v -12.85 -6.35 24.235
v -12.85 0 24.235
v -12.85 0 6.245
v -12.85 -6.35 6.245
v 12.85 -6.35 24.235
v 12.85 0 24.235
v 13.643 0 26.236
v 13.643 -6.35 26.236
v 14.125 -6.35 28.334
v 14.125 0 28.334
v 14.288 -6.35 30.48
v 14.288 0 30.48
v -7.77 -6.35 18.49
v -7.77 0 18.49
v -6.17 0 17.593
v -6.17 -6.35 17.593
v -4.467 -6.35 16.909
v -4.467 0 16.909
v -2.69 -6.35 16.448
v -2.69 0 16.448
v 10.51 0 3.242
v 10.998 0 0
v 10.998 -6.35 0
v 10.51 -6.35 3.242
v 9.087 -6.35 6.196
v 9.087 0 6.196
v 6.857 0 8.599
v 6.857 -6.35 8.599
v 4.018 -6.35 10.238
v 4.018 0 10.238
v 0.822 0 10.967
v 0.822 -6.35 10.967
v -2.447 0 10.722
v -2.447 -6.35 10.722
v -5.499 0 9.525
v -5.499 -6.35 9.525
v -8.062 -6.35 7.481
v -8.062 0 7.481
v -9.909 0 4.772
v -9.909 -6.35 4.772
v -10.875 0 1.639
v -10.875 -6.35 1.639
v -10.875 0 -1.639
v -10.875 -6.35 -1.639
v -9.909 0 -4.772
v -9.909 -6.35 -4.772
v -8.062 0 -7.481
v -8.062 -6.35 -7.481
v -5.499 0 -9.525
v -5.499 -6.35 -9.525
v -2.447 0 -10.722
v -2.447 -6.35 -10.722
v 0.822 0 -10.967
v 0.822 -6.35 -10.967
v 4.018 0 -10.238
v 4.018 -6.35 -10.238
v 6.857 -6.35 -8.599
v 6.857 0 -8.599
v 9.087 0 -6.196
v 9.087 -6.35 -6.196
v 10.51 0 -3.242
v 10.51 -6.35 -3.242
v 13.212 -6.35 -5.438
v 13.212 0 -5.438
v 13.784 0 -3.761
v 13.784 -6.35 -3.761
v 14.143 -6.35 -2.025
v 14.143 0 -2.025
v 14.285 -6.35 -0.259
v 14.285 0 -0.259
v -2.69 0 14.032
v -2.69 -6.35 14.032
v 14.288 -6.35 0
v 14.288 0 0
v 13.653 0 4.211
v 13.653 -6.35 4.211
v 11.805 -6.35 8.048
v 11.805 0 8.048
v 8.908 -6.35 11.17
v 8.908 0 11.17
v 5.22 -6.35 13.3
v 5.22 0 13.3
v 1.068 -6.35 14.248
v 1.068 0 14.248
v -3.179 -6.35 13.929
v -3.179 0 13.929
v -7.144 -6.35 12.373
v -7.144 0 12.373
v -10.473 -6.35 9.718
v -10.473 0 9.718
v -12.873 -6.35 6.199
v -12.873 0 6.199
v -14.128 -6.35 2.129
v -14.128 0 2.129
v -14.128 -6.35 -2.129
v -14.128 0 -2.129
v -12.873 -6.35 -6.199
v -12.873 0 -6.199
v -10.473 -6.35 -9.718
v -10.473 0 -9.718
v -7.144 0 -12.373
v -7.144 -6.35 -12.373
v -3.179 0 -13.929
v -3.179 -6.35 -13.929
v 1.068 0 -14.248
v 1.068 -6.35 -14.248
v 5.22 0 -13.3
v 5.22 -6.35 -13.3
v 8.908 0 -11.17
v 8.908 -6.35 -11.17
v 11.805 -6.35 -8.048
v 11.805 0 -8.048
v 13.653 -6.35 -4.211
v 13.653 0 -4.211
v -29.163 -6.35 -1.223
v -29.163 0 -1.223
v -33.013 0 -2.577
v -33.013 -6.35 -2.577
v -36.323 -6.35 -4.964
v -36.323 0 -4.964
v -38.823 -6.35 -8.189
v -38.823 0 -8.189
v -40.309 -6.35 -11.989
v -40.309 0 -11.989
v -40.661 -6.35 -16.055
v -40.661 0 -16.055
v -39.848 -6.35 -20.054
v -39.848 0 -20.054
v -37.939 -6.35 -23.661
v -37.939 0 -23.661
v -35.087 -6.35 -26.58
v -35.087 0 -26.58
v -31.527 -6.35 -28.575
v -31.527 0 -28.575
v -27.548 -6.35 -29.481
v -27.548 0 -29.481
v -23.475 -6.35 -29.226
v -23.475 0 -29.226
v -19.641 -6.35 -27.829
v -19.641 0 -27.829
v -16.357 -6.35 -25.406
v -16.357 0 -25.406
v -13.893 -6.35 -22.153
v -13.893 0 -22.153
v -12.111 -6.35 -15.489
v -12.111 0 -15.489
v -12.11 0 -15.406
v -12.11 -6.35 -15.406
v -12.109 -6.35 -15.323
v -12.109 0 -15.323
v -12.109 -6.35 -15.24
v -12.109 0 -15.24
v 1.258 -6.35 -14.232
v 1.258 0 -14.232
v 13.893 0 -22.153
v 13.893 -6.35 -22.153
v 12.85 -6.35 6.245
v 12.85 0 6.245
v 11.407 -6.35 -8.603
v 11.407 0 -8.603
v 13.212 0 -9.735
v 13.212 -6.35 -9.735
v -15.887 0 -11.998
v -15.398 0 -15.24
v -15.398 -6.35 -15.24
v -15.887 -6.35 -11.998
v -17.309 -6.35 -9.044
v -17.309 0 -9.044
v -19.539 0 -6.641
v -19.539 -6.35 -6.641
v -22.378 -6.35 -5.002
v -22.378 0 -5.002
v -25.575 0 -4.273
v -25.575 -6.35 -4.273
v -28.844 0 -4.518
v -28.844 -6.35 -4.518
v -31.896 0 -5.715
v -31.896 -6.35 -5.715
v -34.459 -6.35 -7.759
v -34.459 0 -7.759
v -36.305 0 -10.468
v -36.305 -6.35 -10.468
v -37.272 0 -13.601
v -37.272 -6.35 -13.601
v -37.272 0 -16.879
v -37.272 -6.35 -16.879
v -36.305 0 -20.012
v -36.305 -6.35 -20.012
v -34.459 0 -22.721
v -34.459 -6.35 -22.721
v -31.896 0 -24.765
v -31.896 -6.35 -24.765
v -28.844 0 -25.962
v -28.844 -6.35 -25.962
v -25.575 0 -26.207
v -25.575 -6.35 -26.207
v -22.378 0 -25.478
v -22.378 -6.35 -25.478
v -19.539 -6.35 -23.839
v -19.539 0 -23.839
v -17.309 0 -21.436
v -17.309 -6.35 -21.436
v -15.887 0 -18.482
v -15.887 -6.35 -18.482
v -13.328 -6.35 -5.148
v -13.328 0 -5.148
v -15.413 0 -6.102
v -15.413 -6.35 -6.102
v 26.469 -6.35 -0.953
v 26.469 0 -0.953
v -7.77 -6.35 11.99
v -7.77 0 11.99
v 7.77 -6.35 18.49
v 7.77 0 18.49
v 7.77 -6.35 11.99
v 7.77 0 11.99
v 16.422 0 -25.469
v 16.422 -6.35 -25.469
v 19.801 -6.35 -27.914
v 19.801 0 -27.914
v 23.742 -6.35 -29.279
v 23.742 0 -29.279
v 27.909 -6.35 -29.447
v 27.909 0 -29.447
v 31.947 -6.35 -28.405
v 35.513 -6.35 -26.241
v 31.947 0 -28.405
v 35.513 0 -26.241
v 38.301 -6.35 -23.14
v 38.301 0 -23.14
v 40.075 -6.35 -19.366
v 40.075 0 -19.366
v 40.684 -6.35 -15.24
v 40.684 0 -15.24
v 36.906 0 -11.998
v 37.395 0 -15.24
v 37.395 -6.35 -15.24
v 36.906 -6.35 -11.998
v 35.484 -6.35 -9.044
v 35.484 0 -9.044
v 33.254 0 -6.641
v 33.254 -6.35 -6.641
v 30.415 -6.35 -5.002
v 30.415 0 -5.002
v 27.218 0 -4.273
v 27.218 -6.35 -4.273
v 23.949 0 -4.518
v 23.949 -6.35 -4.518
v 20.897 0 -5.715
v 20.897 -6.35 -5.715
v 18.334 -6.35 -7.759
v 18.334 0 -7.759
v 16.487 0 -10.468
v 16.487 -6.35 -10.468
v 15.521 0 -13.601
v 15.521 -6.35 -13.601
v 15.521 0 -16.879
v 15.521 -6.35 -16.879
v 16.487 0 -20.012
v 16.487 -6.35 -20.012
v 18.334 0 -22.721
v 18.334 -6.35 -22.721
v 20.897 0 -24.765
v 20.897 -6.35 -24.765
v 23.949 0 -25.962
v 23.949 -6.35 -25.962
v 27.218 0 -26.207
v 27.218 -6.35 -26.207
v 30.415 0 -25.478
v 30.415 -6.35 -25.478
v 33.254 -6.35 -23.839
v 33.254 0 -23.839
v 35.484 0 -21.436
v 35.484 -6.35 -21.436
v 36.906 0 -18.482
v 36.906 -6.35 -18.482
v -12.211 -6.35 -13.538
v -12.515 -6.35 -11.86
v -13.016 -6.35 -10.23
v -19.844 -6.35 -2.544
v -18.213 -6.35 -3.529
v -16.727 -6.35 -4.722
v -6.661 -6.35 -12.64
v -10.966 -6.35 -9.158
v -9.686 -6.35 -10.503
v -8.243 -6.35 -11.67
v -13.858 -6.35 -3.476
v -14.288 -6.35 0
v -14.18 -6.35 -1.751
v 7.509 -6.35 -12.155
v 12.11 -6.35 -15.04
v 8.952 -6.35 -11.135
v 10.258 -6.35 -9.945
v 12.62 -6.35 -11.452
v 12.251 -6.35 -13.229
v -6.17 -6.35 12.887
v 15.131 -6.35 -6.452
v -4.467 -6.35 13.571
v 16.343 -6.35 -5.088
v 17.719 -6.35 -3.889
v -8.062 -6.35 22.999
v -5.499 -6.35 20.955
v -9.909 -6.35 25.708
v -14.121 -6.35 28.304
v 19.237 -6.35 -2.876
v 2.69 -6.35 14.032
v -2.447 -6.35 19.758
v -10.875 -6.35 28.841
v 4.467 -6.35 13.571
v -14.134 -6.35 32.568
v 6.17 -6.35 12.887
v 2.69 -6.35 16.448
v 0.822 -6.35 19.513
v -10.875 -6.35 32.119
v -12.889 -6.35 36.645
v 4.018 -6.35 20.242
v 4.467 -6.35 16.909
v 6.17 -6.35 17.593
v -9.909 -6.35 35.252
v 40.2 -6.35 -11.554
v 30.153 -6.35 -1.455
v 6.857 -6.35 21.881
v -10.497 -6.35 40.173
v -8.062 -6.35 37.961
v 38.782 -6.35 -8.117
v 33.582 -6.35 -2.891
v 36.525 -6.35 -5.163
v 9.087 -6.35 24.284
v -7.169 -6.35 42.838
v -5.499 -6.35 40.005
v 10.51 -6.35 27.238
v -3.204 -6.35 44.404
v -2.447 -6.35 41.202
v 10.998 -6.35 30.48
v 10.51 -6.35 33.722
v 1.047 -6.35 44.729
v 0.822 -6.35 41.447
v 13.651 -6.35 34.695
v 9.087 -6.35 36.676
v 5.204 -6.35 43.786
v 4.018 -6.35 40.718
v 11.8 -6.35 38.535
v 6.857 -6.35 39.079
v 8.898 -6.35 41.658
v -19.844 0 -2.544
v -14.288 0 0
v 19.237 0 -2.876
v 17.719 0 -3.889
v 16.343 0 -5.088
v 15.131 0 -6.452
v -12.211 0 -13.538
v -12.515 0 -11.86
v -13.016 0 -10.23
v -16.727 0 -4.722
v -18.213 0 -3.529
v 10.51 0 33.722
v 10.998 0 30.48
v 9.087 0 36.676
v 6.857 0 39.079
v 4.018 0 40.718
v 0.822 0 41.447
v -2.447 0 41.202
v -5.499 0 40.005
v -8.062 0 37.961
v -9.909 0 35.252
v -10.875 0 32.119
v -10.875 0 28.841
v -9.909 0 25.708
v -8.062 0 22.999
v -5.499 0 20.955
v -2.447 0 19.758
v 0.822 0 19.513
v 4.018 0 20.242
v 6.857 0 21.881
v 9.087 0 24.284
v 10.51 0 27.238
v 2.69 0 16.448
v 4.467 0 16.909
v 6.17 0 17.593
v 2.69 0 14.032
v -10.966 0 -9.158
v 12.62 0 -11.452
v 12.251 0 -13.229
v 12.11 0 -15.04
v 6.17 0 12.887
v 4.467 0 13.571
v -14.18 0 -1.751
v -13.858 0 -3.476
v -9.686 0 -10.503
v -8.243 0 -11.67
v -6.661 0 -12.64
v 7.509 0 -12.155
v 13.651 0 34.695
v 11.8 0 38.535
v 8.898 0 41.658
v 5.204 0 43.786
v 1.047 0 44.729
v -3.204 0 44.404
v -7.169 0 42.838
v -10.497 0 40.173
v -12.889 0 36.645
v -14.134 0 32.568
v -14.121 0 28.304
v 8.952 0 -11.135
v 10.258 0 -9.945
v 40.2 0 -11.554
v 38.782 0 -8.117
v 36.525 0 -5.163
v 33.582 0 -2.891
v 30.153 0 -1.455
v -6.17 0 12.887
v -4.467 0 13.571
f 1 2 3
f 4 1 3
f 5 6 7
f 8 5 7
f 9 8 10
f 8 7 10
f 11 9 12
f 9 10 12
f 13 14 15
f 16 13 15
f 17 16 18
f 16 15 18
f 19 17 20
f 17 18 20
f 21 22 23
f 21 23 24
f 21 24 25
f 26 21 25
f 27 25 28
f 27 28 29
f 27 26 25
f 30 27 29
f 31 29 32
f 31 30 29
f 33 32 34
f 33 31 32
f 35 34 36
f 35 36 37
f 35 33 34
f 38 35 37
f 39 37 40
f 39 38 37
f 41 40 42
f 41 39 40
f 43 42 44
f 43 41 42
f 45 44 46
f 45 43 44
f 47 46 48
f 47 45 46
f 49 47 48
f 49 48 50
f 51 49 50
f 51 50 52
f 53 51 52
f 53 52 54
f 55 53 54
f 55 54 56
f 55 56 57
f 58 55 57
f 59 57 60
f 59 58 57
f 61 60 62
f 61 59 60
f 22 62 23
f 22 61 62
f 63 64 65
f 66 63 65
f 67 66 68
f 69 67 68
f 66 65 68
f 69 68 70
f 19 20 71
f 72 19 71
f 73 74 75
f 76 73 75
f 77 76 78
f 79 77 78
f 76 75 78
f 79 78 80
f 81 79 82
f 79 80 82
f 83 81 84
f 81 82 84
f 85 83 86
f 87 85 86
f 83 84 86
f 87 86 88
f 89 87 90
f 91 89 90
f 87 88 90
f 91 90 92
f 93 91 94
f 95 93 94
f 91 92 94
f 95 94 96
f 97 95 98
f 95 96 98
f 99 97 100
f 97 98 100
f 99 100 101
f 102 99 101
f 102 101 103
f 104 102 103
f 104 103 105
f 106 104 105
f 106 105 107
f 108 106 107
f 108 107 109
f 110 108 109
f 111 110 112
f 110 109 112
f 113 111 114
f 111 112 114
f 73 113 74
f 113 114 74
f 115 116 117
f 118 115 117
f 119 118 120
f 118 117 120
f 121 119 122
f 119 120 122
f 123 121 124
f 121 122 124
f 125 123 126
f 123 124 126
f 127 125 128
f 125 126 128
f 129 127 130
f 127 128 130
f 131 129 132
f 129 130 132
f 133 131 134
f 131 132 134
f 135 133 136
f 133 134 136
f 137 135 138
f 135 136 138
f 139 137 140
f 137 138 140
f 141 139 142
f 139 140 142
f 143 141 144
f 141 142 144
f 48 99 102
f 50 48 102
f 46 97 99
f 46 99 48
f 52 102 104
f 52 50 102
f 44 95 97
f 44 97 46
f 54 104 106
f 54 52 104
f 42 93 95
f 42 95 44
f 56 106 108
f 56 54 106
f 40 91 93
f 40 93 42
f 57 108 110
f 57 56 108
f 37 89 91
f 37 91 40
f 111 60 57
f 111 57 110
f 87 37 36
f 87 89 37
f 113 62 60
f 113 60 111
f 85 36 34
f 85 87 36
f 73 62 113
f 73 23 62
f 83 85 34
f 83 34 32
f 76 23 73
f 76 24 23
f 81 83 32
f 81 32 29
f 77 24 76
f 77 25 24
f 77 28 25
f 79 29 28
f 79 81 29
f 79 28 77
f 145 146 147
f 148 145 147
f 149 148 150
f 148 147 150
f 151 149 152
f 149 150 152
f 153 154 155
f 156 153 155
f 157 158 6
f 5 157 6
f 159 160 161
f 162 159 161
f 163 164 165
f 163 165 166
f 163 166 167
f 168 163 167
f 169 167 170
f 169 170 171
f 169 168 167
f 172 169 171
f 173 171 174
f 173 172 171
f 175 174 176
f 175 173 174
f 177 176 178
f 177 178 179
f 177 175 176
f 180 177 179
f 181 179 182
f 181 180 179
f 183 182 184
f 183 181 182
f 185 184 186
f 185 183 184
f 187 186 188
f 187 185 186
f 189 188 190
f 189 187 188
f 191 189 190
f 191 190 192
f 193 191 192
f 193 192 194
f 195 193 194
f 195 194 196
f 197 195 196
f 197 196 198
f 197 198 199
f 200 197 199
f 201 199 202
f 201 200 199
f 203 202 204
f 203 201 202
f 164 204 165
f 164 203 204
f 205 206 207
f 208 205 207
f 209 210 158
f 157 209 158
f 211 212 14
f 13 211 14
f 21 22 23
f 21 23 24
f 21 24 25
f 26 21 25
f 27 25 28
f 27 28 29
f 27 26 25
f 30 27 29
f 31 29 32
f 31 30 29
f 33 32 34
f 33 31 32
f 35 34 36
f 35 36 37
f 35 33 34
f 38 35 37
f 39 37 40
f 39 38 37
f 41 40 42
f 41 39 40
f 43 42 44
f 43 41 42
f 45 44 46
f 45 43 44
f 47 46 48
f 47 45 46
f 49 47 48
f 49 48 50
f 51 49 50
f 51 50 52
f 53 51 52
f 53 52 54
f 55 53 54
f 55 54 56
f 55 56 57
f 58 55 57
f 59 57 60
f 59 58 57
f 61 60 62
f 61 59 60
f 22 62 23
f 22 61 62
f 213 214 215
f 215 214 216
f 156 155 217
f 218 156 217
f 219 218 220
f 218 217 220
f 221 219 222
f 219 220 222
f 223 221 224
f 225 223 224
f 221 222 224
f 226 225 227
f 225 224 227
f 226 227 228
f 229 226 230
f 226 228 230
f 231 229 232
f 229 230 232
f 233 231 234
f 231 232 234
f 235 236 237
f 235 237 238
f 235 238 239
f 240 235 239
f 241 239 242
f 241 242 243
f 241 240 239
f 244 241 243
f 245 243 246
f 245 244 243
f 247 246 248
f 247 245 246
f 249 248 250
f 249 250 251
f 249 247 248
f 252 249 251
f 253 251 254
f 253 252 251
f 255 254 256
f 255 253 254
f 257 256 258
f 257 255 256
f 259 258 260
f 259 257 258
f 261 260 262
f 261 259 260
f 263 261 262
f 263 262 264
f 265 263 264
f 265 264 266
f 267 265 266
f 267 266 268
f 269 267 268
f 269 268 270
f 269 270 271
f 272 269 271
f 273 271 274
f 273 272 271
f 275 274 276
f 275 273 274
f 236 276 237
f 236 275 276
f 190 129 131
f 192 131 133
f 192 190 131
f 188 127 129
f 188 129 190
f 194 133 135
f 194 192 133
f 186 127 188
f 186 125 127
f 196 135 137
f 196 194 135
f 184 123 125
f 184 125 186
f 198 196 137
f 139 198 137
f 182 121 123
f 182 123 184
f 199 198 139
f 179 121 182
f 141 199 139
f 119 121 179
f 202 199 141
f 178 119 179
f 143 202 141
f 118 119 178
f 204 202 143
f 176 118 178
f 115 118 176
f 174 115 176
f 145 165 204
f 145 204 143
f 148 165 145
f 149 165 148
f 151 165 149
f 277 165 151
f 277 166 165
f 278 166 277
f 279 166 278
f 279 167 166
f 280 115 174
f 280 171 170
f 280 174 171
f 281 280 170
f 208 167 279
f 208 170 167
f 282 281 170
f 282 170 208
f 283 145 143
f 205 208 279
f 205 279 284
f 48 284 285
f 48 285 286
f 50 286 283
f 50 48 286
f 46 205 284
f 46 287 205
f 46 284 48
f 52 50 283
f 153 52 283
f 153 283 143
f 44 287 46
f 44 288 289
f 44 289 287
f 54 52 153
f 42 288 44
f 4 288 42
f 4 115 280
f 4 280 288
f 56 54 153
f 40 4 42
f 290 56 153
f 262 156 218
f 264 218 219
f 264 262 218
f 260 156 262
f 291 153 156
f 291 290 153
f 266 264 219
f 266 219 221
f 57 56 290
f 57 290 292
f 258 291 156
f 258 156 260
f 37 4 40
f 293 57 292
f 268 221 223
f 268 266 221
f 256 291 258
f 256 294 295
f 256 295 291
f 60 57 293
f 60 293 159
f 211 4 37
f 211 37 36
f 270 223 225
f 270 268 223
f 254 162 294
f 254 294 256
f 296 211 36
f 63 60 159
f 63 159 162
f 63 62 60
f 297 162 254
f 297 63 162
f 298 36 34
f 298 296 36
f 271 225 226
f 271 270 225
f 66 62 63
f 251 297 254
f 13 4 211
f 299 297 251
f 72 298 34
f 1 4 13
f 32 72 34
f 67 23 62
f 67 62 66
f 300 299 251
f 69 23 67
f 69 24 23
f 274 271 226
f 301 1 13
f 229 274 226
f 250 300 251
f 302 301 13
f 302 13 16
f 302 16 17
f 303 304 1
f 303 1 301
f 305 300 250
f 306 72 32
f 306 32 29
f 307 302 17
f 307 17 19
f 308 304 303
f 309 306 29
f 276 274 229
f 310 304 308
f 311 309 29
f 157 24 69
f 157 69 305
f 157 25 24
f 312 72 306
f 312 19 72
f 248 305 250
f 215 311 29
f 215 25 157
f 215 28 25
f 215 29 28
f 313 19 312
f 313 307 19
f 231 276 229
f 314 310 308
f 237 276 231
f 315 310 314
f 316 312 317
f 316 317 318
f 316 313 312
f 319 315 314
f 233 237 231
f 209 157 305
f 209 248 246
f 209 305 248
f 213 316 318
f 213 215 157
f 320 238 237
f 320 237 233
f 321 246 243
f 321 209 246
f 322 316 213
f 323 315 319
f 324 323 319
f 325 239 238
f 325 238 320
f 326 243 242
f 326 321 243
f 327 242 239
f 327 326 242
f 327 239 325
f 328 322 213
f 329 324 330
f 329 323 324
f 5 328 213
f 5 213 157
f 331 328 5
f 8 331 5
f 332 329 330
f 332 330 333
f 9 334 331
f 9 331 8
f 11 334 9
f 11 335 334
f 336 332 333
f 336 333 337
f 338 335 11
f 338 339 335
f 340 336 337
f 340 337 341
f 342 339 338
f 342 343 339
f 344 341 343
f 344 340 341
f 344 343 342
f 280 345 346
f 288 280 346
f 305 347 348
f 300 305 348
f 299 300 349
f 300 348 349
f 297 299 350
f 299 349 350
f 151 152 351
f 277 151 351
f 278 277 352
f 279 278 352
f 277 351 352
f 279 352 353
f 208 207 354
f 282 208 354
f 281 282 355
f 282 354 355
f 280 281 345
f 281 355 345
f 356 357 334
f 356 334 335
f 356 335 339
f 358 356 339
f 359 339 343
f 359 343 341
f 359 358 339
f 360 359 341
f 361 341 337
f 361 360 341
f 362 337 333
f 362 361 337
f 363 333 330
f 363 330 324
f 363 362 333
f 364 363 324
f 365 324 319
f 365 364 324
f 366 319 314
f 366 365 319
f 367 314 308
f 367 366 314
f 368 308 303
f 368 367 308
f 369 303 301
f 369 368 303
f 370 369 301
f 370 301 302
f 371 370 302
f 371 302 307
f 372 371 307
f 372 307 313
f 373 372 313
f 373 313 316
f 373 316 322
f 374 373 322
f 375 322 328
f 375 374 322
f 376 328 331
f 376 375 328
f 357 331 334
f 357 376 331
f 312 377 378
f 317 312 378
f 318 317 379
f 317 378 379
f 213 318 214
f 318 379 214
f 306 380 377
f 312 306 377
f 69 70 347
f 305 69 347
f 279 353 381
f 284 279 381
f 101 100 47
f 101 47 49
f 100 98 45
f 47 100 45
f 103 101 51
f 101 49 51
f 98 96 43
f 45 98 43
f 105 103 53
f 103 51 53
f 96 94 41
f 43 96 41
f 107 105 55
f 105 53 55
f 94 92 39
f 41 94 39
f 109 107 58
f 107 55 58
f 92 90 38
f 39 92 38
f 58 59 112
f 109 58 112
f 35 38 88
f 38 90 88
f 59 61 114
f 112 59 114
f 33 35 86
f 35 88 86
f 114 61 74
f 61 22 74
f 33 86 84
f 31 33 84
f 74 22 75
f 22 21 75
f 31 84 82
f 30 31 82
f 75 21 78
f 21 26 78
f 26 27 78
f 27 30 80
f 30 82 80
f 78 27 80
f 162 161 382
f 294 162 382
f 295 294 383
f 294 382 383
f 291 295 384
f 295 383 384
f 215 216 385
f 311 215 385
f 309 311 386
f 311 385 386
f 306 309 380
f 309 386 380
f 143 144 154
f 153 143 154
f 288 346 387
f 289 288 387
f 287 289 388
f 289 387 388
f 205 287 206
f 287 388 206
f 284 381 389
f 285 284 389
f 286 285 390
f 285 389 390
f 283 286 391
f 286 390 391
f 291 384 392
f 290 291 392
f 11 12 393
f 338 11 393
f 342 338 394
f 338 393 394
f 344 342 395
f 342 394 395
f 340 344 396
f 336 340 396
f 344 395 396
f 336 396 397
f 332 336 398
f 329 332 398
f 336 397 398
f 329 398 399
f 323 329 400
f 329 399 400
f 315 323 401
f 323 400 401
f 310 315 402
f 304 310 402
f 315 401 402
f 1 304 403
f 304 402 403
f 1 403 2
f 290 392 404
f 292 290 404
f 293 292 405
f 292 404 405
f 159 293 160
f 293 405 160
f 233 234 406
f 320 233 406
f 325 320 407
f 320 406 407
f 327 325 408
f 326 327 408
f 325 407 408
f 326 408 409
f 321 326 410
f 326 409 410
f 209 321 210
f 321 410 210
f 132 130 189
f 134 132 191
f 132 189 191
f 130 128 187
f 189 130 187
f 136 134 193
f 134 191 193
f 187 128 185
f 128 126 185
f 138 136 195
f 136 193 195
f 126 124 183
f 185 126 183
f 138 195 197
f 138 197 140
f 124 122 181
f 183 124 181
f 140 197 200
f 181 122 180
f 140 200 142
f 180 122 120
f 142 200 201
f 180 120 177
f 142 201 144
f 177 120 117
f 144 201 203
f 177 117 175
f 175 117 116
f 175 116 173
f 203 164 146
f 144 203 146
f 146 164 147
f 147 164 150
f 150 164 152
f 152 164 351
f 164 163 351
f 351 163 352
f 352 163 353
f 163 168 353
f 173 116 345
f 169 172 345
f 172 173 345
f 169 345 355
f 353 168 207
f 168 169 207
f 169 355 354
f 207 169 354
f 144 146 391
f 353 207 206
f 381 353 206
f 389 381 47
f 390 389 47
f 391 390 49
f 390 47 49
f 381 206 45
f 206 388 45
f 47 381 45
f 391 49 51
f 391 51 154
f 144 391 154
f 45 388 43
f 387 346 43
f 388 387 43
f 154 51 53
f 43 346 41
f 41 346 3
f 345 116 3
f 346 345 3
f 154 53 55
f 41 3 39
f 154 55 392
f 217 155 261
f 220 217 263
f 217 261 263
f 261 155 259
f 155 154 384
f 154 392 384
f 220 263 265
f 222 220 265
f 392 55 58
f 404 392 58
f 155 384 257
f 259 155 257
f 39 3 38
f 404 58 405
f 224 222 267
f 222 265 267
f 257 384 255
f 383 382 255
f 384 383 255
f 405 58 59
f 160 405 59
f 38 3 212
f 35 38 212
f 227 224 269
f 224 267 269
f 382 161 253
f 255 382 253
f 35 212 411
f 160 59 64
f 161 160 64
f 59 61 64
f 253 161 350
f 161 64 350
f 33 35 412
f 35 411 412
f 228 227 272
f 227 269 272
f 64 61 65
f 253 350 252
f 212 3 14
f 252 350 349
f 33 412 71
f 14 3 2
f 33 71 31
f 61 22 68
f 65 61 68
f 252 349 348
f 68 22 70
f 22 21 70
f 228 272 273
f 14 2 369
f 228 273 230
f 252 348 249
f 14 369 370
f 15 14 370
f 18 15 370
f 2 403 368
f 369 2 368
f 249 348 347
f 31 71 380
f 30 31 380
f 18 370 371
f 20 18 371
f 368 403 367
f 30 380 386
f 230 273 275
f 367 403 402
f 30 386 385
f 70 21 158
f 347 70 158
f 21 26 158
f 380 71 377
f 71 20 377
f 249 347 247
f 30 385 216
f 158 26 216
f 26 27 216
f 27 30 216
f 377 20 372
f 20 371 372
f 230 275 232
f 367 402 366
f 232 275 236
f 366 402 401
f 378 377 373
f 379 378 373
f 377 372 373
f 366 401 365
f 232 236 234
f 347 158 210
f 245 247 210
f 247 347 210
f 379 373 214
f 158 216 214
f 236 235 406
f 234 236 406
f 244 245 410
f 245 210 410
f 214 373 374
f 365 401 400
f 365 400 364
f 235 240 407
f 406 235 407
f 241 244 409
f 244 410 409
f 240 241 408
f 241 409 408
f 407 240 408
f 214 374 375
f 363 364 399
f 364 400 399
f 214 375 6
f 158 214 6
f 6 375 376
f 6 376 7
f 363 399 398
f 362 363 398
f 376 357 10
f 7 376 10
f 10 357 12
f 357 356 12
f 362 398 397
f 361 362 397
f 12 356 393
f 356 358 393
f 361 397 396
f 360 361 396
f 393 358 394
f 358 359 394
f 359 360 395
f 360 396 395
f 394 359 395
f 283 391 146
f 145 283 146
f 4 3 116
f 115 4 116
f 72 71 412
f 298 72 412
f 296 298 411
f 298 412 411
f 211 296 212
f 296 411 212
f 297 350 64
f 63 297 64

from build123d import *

# Parameters (mm, degrees)
F1_R     = 10.9982
F2_DEPTH = 6.35
F0_R     = 14.2875
F0_R_2   = 10.9982


# Not quite as in the source:
# - a feature names something its author has since deleted; it is built from what else it names


with BuildPart() as f2:
    # F1 (on Front) → F2 (new body)
    with BuildSketch(Plane.XZ):
        with BuildLine():
            ThreePointArc((-19.843860944, -2.5436943773), (-24.3914551143, -1.0938827063), (-29.162820574, -1.2228721227))
            ThreePointArc((-29.162820574, -1.2228721227), (-37.9387049837, -23.660754454), (-13.8928706881, -22.1532519791))
            ThreePointArc((-13.8928706881, -22.1532519791), (-12.5937995119, -18.9304439908), (-12.1111303918, -15.4893529181))
            ThreePointArc((-12.1111303918, -15.4893529181), (-12.1094983388, -15.3646812066), (-12.1089543073, -15.24))
            ThreePointArc((-12.1089543073, -15.24), (-12.3375720505, -12.6943201423), (-13.0161089443, -10.2301083629))
            ThreePointArc((-13.0161089443, -10.2301083629), (-14.0409790879, -8.0653997775), (-15.4130498534, -6.102304292))
            ThreePointArc((-15.4130498534, -6.102304292), (-17.4497380945, -4.100479128), (-19.843860944, -2.5436943773))
        make_face()
        with Locations((-26.3964543073, -15.24)):
            Circle(F1_R, mode=Mode.SUBTRACT)
        with BuildLine():
            ThreePointArc((12.8504353504, 24.2350846639), (13.9235995942, 27.2759353017), (14.2875, 30.48))
            ThreePointArc((14.2875, 30.48), (-3.2040646983, 44.4035995942), (-12.8504353504, 24.2350846639))
            ThreePointArc((-12.8504353504, 24.2350846639), (-10.7030708192, 21.0154909641), (-7.7704353504, 18.4902964709))
            ThreePointArc((-7.7704353504, 18.4902964709), (-5.3291739909, 17.2235841637), (-2.6904353504, 16.4481001331))
            ThreePointArc((-2.6904353504, 16.4481001331), (0, 16.1925), (2.6904353504, 16.4481001331))
            ThreePointArc((2.6904353504, 16.4481001331), (5.3291739909, 17.2235841637), (7.7704353504, 18.4902964709))
            ThreePointArc((7.7704353504, 18.4902964709), (10.7030708192, 21.0154909641), (12.8504353504, 24.2350846639))
        make_face()
        with Locations((0, 30.48)):
            Circle(F1_R, mode=Mode.SUBTRACT)
        with BuildLine():
            ThreePointArc((40.6839543073, -15.24), (36.5249191169, -5.162953962), (26.4691711959, -0.9526850492))
            ThreePointArc((26.4691711959, -0.9526850492), (22.7246778763, -1.4323675422), (19.2365261049, -2.8760166457))
            ThreePointArc((19.2365261049, -2.8760166457), (17.011936244, -4.4667239445), (15.1311826772, -6.452149788))
            ThreePointArc((15.1311826772, -6.452149788), (14.0619860916, -8.0293446841), (13.2121716662, -9.7347890605))
            ThreePointArc((13.2121716662, -9.7347890605), (12.4074813108, -12.3346100515), (12.1103563293, -15.039848026))
            ThreePointArc((12.1103563293, -15.039848026), (12.5374540198, -18.7128615405), (13.8928706881, -22.1532519791))
            ThreePointArc((13.8928706881, -22.1532519791), (29.9663076159, -29.0743342306), (40.6839543073, -15.24))
        make_face()
        with Locations((26.3964543073, -15.24)):
            Circle(F1_R, mode=Mode.SUBTRACT)
        with BuildLine():
            ThreePointArc((-7.7704353504, 11.9897035291), (-10.7030708192, 9.4645090359), (-12.8504353504, 6.2449153361))
            ThreePointArc((-12.8504353504, 6.2449153361), (-13.9235995942, 3.2040646983), (-14.2875, 0))
            ThreePointArc((-14.2875, 0), (-14.0455567318, -2.6182040304), (-13.3279210191, -5.1477351873))
            ThreePointArc((-13.3279210191, -5.1477351873), (-12.3114587928, -7.2498716295), (-10.9661701776, -9.1583714647))
            ThreePointArc((-10.9661701776, -9.1583714647), (-8.9837608827, -11.109666811), (-6.6608286535, -12.6398583021))
            ThreePointArc((-6.6608286535, -12.6398583021), (-2.8160957214, -14.0072217494), (1.2583537723, -14.231978149))
            ThreePointArc((1.2583537723, -14.231978149), (4.5050529518, -13.5586560599), (7.5091136575, -12.1550758257))
            ThreePointArc((7.5091136575, -12.1550758257), (9.623374139, -10.5604605218), (11.4070274702, -8.6030448415))
            ThreePointArc((11.4070274702, -8.6030448415), (12.4109111642, -7.0782724111), (13.2121716662, -5.4379385904))
            ThreePointArc((13.2121716662, -5.4379385904), (13.9903735339, -2.8986384098), (14.2851490362, -0.2591780564))
            ThreePointArc((14.2851490362, -0.2591780564), (14.2869122469, -0.1295943594), (14.2875, 0))
            ThreePointArc((14.2875, 0), (13.9235995942, 3.2040646983), (12.8504353504, 6.2449153361))
            ThreePointArc((12.8504353504, 6.2449153361), (10.7030708192, 9.4645090359), (7.7704353504, 11.9897035291))
            ThreePointArc((7.7704353504, 11.9897035291), (5.3291739909, 13.2564158363), (2.6904353504, 14.0318998669))
            ThreePointArc((2.6904353504, 14.0318998669), (0, 14.2875), (-2.6904353504, 14.0318998669))
            ThreePointArc((-2.6904353504, 14.0318998669), (-5.3291739909, 13.2564158363), (-7.7704353504, 11.9897035291))
        make_face()
        Circle(F1_R, mode=Mode.SUBTRACT)
        with BuildLine():
            ThreePointArc((-7.7704353504, 18.4902964709), (-10.7030708192, 21.0154909641), (-12.8504353504, 24.2350846639))
            Line((-12.8504353504, 24.2350846639), (-12.8504353504, 6.2449153361))
            ThreePointArc((-12.8504353504, 6.2449153361), (-10.7030708192, 9.4645090359), (-7.7704353504, 11.9897035291))
            Line((-7.7704353504, 11.9897035291), (-7.7704353504, 18.4902964709))
        make_face()
        with BuildLine():
            Line((12.8504353504, 6.2449153361), (12.8504353504, 24.2350846639))
            ThreePointArc((12.8504353504, 24.2350846639), (10.7030708192, 21.0154909641), (7.7704353504, 18.4902964709))
            Line((7.7704353504, 18.4902964709), (7.7704353504, 11.9897035291))
            ThreePointArc((7.7704353504, 11.9897035291), (10.7030708192, 9.4645090359), (12.8504353504, 6.2449153361))
        make_face()
        with BuildLine():
            ThreePointArc((7.5091136575, -12.1550758257), (4.5050529518, -13.5586560599), (1.2583537723, -14.231978149))
            Line((1.2583537723, -14.231978149), (13.8928706881, -22.1532519791))
            ThreePointArc((13.8928706881, -22.1532519791), (12.5374540198, -18.7128615405), (12.1103563293, -15.039848026))
            Line((12.1103563293, -15.039848026), (7.5091136575, -12.1550758257))
        make_face()
        with BuildLine():
            ThreePointArc((-12.1111303918, -15.4893529181), (-12.5937995119, -18.9304439908), (-13.8928706881, -22.1532519791))
            Line((-13.8928706881, -22.1532519791), (1.2583537723, -14.231978149))
            ThreePointArc((1.2583537723, -14.231978149), (-2.8160957214, -14.0072217494), (-6.6608286535, -12.6398583021))
            Line((-6.6608286535, -12.6398583021), (-12.1111303918, -15.4893529181))
        make_face()
        with BuildLine():
            ThreePointArc((-14.2875, 0), (-13.9235995942, 3.2040646983), (-12.8504353504, 6.2449153361))
            Line((-12.8504353504, 6.2449153361), (-29.162820574, -1.2228721227))
            ThreePointArc((-29.162820574, -1.2228721227), (-24.3914551143, -1.0938827063), (-19.843860944, -2.5436943773))
            Line((-19.843860944, -2.5436943773), (-14.2875, 0))
        make_face()
        with BuildLine():
            ThreePointArc((-10.9661701776, -9.1583714647), (-12.3114587928, -7.2498716295), (-13.3279210191, -5.1477351873))
            Line((-13.3279210191, -5.1477351873), (-15.4130498534, -6.102304292))
            ThreePointArc((-15.4130498534, -6.102304292), (-14.0409790879, -8.0653997775), (-13.0161089443, -10.2301083629))
            Line((-13.0161089443, -10.2301083629), (-10.9661701776, -9.1583714647))
        make_face()
        with BuildLine():
            ThreePointArc((2.6904353504, 16.4481001331), (0, 16.1925), (-2.6904353504, 16.4481001331))
            Line((-2.6904353504, 16.4481001331), (-2.6904353504, 14.0318998669))
            ThreePointArc((-2.6904353504, 14.0318998669), (0, 14.2875), (2.6904353504, 14.0318998669))
            Line((2.6904353504, 14.0318998669), (2.6904353504, 16.4481001331))
        make_face()
        with BuildLine():
            Line((26.4691711959, -0.9526850492), (12.8504353504, 6.2449153361))
            ThreePointArc((12.8504353504, 6.2449153361), (13.9235995942, 3.2040646983), (14.2875, 0))
            ThreePointArc((14.2875, 0), (14.2869122469, -0.1295943594), (14.2851490362, -0.2591780564))
            Line((14.2851490362, -0.2591780564), (19.2365261049, -2.8760166457))
            ThreePointArc((19.2365261049, -2.8760166457), (22.7246778763, -1.4323675422), (26.4691711959, -0.9526850492))
        make_face()
        with BuildLine():
            Line((15.1311826772, -6.452149788), (13.2121716662, -5.4379385904))
            ThreePointArc((13.2121716662, -5.4379385904), (12.4109111642, -7.0782724111), (11.4070274702, -8.6030448415))
            Line((11.4070274702, -8.6030448415), (13.2121716662, -9.7347890605))
            ThreePointArc((13.2121716662, -9.7347890605), (14.0619860916, -8.0293446841), (15.1311826772, -6.452149788))
        make_face()
    extrude(amount=F2_DEPTH)


with BuildPart() as f2b:
    # F0 (on Front) → F2, piece 2 (new body)
    with BuildSketch(Plane.XZ):
        Circle(F0_R)
        Circle(F0_R_2, mode=Mode.SUBTRACT)
    extrude(amount=F2_DEPTH)


solid = Compound([f2.part, f2b.part])
